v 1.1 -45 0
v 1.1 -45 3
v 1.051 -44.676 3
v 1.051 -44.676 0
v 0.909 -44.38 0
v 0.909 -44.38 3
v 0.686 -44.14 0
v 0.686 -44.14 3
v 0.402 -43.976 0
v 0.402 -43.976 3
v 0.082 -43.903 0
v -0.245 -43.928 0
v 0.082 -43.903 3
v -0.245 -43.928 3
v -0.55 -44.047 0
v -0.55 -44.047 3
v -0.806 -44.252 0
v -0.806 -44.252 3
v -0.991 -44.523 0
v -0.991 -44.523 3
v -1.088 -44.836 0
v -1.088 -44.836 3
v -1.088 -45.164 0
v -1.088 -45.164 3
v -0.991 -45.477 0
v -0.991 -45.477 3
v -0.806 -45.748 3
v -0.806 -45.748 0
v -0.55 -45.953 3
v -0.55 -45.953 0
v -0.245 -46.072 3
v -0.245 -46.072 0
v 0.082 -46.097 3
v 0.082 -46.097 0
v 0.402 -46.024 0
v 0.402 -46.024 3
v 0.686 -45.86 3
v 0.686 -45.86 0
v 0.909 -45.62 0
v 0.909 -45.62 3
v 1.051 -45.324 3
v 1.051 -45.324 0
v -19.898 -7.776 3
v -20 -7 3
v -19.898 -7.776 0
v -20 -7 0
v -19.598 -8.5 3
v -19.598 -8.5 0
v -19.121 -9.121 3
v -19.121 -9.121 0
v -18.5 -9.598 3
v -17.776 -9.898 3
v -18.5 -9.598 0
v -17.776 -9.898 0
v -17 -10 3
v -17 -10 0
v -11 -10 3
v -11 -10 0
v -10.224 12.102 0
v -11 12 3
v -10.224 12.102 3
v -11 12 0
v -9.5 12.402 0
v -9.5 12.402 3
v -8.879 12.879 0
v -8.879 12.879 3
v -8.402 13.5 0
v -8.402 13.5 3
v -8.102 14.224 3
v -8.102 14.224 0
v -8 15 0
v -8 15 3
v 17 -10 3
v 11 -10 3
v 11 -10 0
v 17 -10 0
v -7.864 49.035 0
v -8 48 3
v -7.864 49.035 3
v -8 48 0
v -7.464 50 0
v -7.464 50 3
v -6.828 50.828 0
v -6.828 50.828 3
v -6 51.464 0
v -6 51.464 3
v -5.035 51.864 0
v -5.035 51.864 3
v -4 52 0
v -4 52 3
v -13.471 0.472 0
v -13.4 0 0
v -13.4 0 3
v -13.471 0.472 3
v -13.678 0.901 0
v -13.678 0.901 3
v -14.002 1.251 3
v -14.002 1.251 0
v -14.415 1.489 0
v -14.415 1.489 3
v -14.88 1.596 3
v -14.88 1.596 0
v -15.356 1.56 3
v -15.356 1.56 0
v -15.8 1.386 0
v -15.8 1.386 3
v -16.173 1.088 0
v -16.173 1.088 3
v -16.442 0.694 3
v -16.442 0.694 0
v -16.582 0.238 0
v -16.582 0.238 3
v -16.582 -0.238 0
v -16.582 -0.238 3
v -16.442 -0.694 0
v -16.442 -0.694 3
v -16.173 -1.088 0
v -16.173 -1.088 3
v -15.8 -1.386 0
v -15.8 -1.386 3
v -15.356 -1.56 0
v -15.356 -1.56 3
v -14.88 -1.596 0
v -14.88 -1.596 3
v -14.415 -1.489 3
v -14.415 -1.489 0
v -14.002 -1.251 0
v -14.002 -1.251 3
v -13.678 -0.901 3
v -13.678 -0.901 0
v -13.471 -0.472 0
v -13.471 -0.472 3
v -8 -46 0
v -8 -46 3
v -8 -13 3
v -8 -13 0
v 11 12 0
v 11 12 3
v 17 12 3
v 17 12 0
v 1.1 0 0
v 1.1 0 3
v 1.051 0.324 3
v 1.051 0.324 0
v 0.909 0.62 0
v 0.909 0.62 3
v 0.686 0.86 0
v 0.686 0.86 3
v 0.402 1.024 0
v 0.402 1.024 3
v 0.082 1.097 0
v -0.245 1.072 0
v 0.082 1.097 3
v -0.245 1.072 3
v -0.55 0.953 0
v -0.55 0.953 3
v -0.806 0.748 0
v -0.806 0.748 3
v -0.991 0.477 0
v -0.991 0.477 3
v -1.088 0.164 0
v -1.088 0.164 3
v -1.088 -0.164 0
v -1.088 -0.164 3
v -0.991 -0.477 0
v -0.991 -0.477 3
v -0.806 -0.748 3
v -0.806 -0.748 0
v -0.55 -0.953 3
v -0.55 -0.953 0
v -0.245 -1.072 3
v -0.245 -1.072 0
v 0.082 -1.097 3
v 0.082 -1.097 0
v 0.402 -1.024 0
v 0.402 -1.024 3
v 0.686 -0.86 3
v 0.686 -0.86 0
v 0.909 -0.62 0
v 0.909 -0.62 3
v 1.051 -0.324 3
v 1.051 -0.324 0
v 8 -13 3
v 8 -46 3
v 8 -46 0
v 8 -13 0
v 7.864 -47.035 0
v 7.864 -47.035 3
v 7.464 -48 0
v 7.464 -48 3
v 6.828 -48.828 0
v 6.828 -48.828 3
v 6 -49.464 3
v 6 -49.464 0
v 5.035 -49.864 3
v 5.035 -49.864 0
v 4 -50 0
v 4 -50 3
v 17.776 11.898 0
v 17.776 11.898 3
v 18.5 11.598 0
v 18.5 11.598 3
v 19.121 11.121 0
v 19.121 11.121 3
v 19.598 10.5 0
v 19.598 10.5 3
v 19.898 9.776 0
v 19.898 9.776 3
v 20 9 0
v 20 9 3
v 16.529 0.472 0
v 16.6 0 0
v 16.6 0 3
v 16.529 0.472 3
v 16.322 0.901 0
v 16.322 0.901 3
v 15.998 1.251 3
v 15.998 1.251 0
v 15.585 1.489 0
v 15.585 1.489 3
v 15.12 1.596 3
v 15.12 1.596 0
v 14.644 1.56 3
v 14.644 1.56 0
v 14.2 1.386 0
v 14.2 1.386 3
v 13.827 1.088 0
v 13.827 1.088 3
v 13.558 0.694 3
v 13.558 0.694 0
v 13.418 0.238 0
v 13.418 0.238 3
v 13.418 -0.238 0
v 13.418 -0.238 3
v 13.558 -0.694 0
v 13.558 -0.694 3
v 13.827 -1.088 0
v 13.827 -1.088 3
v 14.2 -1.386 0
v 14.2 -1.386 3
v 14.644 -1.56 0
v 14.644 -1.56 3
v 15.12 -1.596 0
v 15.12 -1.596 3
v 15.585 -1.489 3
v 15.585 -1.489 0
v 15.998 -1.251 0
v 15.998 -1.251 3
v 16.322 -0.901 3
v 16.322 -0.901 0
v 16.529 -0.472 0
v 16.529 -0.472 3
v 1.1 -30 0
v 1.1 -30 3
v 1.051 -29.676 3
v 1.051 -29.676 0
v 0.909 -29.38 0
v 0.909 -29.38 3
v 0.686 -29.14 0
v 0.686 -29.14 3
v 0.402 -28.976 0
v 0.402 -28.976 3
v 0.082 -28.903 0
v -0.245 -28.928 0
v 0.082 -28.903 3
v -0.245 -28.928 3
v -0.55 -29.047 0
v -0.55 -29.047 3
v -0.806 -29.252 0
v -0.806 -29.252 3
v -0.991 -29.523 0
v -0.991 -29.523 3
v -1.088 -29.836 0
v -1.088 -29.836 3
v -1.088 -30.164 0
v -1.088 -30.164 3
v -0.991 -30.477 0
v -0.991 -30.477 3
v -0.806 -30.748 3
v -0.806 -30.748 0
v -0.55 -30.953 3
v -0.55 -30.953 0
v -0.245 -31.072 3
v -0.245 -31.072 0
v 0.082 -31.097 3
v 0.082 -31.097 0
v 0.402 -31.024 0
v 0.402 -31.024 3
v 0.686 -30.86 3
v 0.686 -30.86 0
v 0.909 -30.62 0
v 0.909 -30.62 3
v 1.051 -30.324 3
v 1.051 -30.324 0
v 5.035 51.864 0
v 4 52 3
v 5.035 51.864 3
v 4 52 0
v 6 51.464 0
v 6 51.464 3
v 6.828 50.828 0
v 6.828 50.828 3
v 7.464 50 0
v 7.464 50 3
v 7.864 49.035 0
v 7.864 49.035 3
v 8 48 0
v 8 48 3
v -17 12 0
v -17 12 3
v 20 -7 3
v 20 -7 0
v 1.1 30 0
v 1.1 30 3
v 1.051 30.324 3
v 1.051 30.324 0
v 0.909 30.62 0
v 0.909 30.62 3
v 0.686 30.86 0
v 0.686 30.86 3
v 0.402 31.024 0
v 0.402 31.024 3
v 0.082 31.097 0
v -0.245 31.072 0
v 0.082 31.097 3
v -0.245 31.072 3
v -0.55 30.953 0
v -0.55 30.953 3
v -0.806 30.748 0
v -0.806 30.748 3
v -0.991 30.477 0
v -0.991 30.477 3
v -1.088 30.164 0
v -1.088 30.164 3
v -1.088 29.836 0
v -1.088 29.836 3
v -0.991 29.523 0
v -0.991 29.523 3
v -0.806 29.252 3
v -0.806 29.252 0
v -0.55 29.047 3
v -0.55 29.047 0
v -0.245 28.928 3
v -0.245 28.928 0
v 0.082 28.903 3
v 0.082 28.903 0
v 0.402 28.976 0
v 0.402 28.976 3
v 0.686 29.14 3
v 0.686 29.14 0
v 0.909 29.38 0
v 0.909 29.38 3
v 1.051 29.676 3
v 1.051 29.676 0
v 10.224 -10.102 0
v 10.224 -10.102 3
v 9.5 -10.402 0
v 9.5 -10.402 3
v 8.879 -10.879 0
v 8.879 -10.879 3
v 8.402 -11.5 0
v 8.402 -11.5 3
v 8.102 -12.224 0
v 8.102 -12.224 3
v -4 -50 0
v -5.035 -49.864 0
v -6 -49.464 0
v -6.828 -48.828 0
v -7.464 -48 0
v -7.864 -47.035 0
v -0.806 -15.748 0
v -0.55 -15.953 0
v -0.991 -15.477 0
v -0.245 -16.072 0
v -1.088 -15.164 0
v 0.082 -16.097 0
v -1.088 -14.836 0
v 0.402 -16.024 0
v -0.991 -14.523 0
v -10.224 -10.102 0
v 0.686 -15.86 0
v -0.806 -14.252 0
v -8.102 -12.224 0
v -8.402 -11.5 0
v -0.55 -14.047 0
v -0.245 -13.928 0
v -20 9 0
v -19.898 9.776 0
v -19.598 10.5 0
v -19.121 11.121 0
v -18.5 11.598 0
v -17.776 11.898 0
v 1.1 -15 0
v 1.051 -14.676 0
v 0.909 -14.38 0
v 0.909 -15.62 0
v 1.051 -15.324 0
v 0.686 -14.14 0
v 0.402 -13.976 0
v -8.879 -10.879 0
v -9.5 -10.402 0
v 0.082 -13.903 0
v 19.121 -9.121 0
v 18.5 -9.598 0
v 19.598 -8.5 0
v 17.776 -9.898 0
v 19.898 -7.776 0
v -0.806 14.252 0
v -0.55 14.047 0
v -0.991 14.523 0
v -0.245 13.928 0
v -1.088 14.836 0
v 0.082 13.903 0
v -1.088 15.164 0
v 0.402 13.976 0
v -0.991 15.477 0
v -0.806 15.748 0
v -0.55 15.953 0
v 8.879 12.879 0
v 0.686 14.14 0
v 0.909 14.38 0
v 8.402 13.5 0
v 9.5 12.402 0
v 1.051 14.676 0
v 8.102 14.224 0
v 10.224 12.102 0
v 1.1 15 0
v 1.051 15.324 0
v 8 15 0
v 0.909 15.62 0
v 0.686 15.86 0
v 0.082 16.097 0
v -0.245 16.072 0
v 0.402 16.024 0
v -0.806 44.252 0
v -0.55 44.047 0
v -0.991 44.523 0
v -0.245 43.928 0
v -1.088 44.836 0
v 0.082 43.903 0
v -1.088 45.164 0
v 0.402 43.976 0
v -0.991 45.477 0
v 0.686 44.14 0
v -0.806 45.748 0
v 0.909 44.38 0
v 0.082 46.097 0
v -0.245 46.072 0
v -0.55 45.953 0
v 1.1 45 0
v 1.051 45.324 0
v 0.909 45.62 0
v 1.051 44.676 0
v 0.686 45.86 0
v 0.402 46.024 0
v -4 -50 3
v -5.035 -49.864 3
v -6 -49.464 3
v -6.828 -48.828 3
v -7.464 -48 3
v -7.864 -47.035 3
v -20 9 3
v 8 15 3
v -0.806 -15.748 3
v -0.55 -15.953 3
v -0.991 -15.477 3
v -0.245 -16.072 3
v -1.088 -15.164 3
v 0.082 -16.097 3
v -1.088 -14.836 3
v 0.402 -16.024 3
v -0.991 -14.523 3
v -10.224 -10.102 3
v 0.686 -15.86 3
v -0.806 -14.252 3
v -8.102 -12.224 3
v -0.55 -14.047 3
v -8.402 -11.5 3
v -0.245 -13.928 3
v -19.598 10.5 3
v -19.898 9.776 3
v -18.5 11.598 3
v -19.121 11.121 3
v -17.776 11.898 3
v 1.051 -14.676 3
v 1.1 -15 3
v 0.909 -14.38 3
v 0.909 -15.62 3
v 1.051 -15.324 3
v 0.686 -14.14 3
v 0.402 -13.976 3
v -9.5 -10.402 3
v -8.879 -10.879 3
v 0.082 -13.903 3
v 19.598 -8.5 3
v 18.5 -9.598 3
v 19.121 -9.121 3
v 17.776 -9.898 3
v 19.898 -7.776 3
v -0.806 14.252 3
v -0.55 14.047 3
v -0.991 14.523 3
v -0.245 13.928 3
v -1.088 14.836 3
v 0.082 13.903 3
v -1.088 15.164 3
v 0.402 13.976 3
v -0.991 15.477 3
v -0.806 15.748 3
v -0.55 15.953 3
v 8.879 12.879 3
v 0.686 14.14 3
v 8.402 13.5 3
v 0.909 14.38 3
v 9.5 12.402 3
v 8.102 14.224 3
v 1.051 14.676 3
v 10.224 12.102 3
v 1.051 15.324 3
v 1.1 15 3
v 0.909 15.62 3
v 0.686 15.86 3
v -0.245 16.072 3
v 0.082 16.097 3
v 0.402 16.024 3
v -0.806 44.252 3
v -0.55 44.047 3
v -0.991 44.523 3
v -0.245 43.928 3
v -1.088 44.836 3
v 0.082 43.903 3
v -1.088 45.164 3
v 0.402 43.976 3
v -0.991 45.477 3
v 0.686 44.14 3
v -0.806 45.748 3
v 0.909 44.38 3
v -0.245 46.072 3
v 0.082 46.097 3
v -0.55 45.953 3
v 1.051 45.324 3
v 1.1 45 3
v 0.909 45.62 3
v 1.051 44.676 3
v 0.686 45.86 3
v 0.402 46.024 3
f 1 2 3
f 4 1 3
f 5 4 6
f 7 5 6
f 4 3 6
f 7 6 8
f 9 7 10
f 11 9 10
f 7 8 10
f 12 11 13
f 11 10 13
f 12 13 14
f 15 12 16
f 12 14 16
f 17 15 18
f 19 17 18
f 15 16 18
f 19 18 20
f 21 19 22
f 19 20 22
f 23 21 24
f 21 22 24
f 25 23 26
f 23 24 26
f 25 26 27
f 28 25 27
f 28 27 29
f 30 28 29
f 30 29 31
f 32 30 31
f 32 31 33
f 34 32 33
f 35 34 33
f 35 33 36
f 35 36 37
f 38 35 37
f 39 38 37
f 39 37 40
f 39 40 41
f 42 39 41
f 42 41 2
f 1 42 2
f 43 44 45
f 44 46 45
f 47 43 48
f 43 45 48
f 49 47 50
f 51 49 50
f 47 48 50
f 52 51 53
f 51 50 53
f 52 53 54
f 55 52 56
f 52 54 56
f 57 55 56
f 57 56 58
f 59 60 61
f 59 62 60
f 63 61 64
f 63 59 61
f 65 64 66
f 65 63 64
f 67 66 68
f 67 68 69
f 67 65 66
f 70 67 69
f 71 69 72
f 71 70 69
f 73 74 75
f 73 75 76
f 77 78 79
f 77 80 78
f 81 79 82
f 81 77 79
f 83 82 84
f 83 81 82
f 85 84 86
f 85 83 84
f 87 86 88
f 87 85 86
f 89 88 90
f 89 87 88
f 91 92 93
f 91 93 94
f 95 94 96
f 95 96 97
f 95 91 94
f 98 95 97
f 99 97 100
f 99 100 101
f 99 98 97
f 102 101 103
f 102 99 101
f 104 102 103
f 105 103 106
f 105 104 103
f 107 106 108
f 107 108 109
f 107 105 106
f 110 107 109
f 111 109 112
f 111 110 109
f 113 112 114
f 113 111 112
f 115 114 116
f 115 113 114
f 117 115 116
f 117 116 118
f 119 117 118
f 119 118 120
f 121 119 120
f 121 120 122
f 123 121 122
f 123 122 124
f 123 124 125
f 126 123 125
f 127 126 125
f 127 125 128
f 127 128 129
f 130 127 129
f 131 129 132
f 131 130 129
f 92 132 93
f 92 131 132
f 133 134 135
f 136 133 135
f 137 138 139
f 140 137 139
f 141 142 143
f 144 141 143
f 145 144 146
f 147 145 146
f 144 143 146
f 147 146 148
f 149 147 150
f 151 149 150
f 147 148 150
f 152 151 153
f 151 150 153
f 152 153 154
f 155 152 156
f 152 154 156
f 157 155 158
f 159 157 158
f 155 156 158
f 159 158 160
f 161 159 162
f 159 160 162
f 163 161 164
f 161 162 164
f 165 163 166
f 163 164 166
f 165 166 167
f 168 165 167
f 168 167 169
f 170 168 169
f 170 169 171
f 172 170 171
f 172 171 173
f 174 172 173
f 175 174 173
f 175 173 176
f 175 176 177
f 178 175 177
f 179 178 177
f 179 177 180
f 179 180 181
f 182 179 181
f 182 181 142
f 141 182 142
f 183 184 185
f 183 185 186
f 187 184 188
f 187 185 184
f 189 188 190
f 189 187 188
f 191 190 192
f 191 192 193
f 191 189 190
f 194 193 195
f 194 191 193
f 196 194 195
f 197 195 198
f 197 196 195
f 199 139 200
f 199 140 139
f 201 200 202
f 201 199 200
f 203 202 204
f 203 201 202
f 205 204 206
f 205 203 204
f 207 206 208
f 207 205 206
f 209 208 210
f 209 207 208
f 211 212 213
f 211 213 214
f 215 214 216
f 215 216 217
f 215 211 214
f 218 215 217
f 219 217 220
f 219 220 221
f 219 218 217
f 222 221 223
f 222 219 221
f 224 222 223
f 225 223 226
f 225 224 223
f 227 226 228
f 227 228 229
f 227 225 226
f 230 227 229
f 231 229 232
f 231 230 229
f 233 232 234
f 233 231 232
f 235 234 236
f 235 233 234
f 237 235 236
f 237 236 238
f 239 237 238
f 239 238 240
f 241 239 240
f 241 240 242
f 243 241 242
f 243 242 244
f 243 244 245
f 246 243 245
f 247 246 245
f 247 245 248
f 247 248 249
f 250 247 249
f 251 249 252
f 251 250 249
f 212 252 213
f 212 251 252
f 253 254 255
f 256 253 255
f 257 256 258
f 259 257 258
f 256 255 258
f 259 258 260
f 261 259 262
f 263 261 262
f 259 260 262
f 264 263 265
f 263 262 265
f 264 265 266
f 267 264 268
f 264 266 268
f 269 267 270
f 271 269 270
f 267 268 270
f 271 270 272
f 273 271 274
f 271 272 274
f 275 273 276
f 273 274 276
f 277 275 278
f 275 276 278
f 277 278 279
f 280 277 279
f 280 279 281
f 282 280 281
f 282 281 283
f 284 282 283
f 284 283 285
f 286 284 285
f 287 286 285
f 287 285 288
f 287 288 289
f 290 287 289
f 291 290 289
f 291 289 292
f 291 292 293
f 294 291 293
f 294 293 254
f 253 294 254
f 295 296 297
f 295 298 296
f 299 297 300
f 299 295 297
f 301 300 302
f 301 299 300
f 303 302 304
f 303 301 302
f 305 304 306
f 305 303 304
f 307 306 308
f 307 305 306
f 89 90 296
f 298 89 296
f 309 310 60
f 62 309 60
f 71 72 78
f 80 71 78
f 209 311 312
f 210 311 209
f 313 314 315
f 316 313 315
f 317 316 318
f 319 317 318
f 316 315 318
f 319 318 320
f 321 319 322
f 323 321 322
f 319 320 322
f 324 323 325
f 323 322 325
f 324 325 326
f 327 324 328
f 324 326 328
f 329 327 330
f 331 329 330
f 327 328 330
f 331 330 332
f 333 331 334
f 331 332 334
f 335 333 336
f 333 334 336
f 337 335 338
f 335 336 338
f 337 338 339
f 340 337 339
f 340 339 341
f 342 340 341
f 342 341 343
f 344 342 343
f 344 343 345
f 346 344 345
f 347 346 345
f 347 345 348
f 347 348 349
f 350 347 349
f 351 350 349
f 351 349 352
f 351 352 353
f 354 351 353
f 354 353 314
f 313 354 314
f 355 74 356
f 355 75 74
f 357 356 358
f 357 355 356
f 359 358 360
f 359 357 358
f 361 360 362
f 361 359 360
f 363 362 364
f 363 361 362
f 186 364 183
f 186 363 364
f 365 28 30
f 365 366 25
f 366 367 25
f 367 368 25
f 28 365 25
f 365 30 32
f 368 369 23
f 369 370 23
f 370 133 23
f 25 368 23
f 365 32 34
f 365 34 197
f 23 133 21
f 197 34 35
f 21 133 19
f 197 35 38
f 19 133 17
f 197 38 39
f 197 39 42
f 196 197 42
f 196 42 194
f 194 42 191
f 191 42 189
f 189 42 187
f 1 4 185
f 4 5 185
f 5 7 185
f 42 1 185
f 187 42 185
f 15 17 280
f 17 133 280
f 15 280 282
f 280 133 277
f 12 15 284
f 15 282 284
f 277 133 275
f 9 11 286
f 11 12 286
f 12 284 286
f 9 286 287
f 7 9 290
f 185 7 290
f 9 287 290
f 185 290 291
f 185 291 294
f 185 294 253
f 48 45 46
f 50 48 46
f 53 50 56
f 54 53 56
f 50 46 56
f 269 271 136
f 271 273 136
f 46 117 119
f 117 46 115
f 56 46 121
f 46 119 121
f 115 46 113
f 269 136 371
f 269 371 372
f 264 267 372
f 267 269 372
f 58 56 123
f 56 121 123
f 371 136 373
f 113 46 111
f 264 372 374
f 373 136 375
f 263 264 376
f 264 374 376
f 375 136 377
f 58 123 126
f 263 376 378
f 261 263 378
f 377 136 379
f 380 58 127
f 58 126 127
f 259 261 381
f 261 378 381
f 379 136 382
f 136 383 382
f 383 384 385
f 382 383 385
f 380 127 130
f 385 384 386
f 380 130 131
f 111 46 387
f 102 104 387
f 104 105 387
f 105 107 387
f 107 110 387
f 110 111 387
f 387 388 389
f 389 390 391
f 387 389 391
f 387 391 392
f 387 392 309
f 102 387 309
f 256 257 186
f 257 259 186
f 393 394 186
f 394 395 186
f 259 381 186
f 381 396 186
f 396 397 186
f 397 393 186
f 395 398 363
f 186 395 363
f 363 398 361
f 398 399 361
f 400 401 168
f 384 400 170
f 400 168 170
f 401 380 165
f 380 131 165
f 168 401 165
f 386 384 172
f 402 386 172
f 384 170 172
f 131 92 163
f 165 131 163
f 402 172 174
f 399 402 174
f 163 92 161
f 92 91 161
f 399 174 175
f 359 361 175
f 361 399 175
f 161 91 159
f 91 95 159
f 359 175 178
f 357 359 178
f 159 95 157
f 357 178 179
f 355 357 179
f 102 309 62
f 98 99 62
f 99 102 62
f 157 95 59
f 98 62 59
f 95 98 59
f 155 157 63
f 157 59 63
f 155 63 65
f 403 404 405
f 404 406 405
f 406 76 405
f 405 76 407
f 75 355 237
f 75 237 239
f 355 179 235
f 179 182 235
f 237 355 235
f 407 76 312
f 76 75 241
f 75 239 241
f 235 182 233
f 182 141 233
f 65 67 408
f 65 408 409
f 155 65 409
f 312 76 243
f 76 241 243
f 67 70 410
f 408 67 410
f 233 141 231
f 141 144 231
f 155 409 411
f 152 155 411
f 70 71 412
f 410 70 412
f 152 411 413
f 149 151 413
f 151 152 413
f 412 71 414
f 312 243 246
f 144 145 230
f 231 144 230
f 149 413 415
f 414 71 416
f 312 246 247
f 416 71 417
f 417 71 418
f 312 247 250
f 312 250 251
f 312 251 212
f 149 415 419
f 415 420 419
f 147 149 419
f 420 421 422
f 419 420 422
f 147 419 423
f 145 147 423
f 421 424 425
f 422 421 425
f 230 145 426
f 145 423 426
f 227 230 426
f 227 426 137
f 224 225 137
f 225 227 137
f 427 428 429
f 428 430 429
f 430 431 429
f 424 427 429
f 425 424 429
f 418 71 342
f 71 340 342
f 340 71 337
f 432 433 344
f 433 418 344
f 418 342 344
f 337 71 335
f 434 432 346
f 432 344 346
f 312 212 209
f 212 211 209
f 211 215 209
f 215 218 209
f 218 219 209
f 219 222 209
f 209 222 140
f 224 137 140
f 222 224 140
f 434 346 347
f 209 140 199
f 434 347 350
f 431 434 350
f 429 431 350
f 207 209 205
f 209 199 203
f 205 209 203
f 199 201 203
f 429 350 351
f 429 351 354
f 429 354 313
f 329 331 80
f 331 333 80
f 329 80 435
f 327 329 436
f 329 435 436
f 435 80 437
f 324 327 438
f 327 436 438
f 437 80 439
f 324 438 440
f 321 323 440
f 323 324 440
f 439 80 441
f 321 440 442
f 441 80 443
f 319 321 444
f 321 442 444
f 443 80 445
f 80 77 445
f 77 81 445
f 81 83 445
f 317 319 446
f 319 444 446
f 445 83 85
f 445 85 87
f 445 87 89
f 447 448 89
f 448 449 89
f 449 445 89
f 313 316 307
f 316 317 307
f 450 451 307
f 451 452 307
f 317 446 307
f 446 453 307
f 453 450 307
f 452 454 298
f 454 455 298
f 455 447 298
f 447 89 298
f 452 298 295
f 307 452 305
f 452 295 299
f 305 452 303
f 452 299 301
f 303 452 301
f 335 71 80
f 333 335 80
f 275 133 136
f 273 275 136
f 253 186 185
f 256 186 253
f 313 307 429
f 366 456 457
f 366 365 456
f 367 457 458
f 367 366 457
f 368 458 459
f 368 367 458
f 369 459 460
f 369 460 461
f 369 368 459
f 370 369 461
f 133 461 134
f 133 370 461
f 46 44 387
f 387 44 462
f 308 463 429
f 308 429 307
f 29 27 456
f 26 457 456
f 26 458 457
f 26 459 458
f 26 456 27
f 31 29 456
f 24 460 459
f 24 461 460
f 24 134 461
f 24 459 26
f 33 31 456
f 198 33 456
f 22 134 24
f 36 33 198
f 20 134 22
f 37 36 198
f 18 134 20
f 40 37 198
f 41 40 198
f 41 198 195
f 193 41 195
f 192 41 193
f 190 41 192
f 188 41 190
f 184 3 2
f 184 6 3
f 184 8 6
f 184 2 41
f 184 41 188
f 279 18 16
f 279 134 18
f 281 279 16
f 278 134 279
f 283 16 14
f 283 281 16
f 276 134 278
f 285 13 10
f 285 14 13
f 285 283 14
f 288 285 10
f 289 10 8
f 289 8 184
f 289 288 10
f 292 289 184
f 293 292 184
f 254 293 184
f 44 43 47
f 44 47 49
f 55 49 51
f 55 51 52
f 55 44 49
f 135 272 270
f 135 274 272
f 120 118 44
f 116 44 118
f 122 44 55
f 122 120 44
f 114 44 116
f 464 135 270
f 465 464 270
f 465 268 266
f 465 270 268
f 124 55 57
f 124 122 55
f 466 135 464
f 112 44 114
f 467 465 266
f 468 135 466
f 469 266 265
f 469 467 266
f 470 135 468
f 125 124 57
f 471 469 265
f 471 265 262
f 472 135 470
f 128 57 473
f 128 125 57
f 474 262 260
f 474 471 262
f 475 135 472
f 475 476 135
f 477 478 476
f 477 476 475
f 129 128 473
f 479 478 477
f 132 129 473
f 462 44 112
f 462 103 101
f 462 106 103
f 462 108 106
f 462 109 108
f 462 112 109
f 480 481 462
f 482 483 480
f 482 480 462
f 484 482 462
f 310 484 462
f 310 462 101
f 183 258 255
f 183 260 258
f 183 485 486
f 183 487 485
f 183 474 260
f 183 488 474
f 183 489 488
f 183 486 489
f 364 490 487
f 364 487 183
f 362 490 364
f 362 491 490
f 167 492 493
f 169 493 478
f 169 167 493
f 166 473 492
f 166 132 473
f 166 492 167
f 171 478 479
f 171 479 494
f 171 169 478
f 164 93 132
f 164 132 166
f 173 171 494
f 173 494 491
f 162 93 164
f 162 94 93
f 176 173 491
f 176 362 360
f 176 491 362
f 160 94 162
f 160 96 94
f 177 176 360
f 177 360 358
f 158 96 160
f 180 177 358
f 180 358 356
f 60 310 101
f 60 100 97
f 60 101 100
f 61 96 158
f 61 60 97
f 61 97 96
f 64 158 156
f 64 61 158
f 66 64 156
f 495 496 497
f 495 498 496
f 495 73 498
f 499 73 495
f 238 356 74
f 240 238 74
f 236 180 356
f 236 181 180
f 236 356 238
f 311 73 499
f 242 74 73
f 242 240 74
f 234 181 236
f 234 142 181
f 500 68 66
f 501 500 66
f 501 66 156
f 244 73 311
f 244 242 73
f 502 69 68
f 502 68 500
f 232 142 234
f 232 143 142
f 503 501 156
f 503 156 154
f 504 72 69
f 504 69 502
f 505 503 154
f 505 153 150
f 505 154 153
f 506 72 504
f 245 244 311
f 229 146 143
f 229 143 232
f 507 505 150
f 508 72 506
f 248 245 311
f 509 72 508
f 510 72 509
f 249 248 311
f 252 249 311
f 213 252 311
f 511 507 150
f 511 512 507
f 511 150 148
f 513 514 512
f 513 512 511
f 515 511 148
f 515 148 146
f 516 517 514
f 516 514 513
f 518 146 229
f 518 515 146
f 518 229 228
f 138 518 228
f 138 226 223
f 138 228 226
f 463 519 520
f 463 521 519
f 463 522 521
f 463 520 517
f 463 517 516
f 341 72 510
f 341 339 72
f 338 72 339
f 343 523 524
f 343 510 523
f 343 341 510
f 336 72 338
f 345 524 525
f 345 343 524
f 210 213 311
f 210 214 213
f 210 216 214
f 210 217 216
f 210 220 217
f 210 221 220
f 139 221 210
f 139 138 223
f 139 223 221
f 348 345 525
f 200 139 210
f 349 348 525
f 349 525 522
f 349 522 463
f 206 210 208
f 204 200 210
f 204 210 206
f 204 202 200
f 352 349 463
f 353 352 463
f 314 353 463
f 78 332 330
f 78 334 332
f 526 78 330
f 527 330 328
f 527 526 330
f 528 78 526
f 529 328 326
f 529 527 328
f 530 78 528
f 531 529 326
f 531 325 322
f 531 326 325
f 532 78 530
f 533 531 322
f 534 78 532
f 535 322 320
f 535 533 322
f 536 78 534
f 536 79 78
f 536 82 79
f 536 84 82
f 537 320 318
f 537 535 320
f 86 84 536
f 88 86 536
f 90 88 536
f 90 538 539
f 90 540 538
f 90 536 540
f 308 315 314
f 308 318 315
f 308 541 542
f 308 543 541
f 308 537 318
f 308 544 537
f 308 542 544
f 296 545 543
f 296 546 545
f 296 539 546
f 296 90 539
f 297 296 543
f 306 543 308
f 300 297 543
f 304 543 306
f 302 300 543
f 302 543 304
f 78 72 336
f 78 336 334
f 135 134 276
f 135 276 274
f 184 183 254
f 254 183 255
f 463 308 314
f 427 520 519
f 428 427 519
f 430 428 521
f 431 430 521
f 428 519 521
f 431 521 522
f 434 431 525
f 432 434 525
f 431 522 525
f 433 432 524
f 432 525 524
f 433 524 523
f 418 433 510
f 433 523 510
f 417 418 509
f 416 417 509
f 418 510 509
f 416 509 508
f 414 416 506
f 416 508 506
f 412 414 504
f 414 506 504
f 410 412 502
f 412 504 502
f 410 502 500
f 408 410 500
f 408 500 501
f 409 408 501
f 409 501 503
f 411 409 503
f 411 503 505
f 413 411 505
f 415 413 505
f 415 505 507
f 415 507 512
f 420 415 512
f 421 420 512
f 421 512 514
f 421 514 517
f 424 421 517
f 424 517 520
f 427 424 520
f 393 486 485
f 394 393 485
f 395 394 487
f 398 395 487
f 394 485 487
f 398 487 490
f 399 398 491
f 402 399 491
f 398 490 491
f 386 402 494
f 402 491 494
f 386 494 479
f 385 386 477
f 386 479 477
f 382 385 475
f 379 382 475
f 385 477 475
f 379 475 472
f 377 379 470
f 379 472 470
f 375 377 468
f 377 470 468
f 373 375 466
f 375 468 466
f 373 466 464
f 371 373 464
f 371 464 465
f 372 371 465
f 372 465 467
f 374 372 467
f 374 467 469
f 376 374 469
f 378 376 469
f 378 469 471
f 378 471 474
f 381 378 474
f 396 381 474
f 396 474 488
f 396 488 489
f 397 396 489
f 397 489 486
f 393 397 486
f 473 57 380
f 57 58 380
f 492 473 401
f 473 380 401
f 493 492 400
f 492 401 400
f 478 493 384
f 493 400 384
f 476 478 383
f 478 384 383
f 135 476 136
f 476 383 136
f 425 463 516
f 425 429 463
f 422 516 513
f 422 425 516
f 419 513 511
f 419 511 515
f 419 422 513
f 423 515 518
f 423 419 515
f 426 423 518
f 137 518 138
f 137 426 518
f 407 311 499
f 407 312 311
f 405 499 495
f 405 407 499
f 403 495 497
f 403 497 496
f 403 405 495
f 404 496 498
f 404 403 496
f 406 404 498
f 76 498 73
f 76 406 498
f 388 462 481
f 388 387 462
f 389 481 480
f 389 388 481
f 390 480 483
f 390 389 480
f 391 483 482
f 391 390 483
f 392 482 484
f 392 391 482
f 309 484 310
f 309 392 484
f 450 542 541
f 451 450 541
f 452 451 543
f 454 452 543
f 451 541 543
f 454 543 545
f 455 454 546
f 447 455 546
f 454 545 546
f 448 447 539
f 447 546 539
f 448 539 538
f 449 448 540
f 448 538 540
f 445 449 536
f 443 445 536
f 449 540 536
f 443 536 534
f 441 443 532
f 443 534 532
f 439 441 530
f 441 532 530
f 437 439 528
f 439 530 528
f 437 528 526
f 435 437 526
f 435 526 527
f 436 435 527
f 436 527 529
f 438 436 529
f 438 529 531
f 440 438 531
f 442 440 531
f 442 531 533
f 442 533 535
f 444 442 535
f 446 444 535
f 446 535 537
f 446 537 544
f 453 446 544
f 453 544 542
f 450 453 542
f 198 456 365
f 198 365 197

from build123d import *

# Parameters (mm, degrees)
SKETCH_1_W          = 40
SKETCH_1_H          = 150
SKETCH_1_R          = 1.6
EXTRUDE_1_DEPTH     = 3
SKETCH_2_R          = 1.1
CUT_EXTRUDE_1_DEPTH = 4
SKETCH_4_W          = 40
SKETCH_4_H          = 18
CUT_EXTRUDE_3_DEPTH = 10
SKETCH_5_W          = 40
SKETCH_5_H          = 12
EXTRUDE_2_DEPTH     = 3
SKETCH_6_R          = 1.1
CUT_EXTRUDE_4_DEPTH = 10
SKETCH_7_W          = 12
SKETCH_7_H          = 75
SKETCH_7_H_2        = 47
CUT_EXTRUDE_5_DEPTH = 10
FILLET_1_R          = 3
SKETCH_8_W          = 16
SKETCH_8_H          = 42.139164074
SKETCH_8_H_2        = 21.417935282
CUT_EXTRUDE_6_DEPTH = 10
FILLET_2_R          = 4


with BuildPart() as part:
    # 草图1 → 凸台-拉伸1 (new body)
    with BuildSketch(Plane.XY):
        Rectangle(SKETCH_1_W, SKETCH_1_H)
        with Locations((-15, 0)):
            Circle(SKETCH_1_R, mode=Mode.SUBTRACT)
        with Locations((15, 0)):
            Circle(SKETCH_1_R, mode=Mode.SUBTRACT)
    extrude(amount=EXTRUDE_1_DEPTH)

    # 草图2 → 切除-拉伸1 (cut, through all)
    with BuildSketch(Plane.XY.offset(3)):
        with Locations((0, 30)):
            Circle(SKETCH_2_R)
        with Locations((0, 45)):
            Circle(SKETCH_2_R)
        with Locations((0, 60)):
            Circle(SKETCH_2_R)
        with Locations((0, 15)):
            Circle(SKETCH_2_R)
        with Locations((0, -15)):
            Circle(SKETCH_2_R)
        Circle(SKETCH_2_R)
        with Locations((0, -30)):
            Circle(SKETCH_2_R)
        with Locations((0, -45)):
            Circle(SKETCH_2_R)
        with Locations((0, -60)):
            Circle(SKETCH_2_R)
    extrude(amount=-CUT_EXTRUDE_1_DEPTH, mode=Mode.SUBTRACT)

    # 草图4 → 切除-拉伸3 (cut)
    with BuildSketch(Plane.XY.offset(3)):
        with Locations((0, -66)):
            Rectangle(SKETCH_4_W, SKETCH_4_H)
    extrude(amount=-CUT_EXTRUDE_3_DEPTH, mode=Mode.SUBTRACT)

    # 草图5 → 凸台-拉伸2 (add)
    with BuildSketch(Plane.XY.offset(3)):
        with Locations((0, 81)):
            Rectangle(SKETCH_5_W, SKETCH_5_H)
    extrude(amount=-EXTRUDE_2_DEPTH)

    # 草图6 → 切除-拉伸4 (cut)
    with BuildSketch(Plane.XY.offset(3)):
        with Locations((0, 75)):
            Circle(SKETCH_6_R)
    extrude(amount=-CUT_EXTRUDE_4_DEPTH, mode=Mode.SUBTRACT)

    # 草图7 → 切除-拉伸5 (cut)
    with BuildSketch(Plane.XY.offset(3)):
        with Locations((-14, 49.5)):
            Rectangle(SKETCH_7_W, SKETCH_7_H)
        with Locations((-14, -33.5)):
            Rectangle(SKETCH_7_W, SKETCH_7_H_2)
        with Locations((14, -33.5)):
            Rectangle(SKETCH_7_W, SKETCH_7_H_2)
        with Locations((14, 49.5)):
            Rectangle(SKETCH_7_W, SKETCH_7_H)
    extrude(amount=-CUT_EXTRUDE_5_DEPTH, mode=Mode.SUBTRACT)

    # 圆角1
    fillet_1_edges = [part.edges().sort_by_distance(p)[0] for p in [
        (-8, 87, 1.5),
        (8, 87, 1.5),
        (-8, -57, 1.5),
        (8, -57, 1.5),
        (20, 12, 1.5),
        (8, 12, 1.5),
        (8, -10, 1.5),
        (20, -10, 1.5),
        (-20, -10, 1.5),
        (-8, -10, 1.5),
        (-20, 12, 1.5),
        (-8, 12, 1.5),
    ]]
    fillet(fillet_1_edges, radius=FILLET_1_R)

    # 草图8 → 切除-拉伸6 (cut)
    with BuildSketch(Plane.XY.offset(3)):
        with Locations((0, 73.069582037)):
            Rectangle(SKETCH_8_W, SKETCH_8_H)
        with Locations((0, -60.708967641)):
            Rectangle(SKETCH_8_W, SKETCH_8_H_2)
    extrude(amount=-CUT_EXTRUDE_6_DEPTH, mode=Mode.SUBTRACT)

    # 圆角2
    fillet_2_edges = [part.edges().sort_by_distance(p)[0] for p in [
        (8, 52, 1.5),
        (-8, 52, 1.5),
        (8, -50, 1.5),
        (-8, -50, 1.5),
    ]]
    fillet(fillet_2_edges, radius=FILLET_2_R)


solid = part.part
